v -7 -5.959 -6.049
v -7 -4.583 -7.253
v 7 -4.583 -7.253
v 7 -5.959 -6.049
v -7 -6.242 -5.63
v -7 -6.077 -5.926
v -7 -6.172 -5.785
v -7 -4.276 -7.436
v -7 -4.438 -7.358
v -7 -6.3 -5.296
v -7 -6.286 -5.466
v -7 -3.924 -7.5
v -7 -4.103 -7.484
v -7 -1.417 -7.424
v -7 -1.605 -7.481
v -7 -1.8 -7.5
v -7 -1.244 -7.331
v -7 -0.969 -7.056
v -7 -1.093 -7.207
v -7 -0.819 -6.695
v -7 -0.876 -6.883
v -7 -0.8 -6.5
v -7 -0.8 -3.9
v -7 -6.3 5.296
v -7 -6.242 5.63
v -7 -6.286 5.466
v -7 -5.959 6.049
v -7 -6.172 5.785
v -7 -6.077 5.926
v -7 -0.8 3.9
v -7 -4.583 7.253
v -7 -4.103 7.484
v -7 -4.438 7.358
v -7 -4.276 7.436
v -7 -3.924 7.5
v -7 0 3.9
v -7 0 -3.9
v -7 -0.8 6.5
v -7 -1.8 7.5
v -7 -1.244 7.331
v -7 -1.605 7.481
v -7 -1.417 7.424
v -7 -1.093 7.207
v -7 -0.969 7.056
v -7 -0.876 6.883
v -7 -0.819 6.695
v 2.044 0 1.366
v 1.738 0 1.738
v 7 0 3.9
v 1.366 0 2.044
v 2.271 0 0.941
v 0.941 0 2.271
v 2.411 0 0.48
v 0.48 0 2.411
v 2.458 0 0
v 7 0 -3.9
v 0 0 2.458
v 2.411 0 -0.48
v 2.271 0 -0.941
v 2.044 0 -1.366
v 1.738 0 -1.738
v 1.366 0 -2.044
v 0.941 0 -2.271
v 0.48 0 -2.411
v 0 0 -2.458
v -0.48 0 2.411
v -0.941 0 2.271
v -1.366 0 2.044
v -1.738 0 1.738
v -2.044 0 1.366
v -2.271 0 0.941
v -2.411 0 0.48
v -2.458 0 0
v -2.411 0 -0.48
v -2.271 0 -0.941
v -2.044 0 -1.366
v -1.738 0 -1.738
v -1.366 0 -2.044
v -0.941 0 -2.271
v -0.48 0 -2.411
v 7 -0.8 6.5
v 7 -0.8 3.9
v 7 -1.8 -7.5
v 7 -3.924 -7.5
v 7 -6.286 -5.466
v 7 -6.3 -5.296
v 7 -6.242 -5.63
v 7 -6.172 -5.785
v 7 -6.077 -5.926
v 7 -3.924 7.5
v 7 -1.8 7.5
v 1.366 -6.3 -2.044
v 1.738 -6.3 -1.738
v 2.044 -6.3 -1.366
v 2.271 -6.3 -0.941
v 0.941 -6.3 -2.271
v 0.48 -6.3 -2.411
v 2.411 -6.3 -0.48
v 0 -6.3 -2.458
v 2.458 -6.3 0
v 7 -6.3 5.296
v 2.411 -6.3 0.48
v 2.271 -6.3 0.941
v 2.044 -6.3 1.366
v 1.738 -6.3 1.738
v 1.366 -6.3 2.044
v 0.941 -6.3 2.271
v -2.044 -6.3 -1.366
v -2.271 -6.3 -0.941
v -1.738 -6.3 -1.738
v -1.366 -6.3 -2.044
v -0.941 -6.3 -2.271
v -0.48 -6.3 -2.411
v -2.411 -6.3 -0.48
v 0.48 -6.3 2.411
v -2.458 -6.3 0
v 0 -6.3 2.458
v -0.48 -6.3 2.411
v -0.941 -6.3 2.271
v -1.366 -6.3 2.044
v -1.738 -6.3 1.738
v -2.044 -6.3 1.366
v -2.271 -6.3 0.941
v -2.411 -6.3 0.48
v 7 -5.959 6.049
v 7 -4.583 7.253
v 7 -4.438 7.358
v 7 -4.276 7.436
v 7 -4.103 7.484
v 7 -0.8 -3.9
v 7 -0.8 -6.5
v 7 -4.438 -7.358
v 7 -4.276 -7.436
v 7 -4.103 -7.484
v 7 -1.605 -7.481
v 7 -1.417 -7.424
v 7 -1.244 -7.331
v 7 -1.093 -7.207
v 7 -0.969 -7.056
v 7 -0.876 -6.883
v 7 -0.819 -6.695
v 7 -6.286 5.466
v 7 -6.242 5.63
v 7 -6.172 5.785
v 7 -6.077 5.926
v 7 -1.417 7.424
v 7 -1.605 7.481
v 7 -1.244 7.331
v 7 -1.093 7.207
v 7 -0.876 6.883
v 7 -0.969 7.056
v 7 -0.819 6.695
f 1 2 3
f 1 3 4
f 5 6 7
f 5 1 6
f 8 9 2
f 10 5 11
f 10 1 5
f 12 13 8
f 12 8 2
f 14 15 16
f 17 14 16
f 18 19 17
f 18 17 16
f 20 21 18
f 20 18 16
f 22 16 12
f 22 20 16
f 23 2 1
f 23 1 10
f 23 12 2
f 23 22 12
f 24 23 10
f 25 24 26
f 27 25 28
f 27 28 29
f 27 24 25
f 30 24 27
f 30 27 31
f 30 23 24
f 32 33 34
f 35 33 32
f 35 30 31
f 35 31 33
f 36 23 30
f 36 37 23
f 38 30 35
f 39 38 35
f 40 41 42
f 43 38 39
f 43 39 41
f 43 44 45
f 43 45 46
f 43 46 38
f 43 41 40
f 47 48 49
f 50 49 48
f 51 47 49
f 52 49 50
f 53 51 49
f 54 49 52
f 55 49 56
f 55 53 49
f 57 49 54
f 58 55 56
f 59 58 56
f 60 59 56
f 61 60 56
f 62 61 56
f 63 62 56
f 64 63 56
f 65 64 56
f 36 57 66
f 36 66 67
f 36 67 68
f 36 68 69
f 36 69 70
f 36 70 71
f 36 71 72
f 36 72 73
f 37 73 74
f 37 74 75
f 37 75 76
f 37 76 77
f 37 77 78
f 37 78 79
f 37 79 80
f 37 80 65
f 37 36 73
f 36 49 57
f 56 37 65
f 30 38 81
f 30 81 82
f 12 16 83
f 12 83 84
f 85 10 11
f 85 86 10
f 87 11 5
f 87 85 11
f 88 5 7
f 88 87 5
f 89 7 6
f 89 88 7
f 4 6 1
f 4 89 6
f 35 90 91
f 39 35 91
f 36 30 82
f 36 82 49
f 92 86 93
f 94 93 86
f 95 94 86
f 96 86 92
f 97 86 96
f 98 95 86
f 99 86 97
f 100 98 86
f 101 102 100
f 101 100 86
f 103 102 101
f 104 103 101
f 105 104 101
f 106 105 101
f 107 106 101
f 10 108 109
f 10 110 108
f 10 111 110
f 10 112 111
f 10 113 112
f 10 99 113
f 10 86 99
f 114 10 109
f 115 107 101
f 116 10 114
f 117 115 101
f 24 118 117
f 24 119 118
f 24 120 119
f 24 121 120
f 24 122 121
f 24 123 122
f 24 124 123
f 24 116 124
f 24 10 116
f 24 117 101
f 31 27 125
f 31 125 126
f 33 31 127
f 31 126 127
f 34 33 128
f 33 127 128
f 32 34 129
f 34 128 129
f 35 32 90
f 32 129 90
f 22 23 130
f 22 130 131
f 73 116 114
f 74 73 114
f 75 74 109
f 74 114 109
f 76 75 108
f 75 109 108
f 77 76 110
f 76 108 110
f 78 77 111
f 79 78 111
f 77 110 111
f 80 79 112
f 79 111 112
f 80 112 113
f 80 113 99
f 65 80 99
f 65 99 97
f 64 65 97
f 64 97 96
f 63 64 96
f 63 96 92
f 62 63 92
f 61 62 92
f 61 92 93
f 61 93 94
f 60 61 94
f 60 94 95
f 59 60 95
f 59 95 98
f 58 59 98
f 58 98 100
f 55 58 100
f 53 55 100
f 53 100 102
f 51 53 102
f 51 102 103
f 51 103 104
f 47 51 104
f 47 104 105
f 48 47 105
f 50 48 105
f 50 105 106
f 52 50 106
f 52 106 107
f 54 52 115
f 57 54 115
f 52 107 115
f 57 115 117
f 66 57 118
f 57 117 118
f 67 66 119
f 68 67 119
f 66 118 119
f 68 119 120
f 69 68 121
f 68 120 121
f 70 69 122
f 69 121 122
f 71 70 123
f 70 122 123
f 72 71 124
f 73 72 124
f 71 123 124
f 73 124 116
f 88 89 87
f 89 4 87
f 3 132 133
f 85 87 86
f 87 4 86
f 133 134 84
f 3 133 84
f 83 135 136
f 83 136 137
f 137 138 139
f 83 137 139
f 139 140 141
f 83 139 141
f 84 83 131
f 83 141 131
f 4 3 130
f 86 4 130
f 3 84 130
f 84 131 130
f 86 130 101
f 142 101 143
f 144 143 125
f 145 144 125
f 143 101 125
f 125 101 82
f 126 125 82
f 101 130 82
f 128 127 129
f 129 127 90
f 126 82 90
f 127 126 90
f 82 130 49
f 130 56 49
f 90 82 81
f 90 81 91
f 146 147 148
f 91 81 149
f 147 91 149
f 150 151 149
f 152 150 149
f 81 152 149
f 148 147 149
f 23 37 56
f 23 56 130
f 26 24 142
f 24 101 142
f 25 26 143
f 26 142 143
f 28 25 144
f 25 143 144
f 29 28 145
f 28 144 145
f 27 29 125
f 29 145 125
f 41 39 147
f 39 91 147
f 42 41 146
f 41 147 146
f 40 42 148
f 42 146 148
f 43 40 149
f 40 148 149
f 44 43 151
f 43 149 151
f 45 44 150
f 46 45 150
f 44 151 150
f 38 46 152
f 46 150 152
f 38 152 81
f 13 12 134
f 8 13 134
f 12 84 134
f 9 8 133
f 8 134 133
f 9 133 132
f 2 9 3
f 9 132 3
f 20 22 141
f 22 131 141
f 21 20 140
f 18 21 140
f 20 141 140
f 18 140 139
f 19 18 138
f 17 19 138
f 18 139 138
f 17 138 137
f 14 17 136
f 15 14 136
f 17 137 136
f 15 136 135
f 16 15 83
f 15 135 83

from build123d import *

# Parameters (mm, degrees)
BOSS_EXTRUDE1_DEPTH = 14
FILLET1_R           = 1
TAPPED_HOLE1_D      = 4.917


with BuildPart() as part:
    # Sketch1 → Boss-Extrude1 (new body)
    with BuildSketch(Plane(origin=(-7, 0, 0), x_dir=(0, 0, -1), z_dir=(1, 0, 0))):
        Polygon((5.75, -6.3), (-5.75, -6.3), (-7.5, -4.3), (-7.5, -0.8), (-3.9, -0.8), (-3.9, 0), (3.9, 0), (3.9, -0.8), (7.5, -0.8), (7.5, -4.3), align=None)
    extrude(amount=BOSS_EXTRUDE1_DEPTH)

    # Fillet1
    fillet1_edges = [part.edges().sort_by_distance(p)[0] for p in [
        (0, -0.8, -7.5),
        (0, -4.3, -7.5),
        (0, -6.3, -5.75),
        (0, -6.3, 5.75),
        (0, -4.3, 7.5),
        (0, -0.8, 7.5),
    ]]
    fillet(fillet1_edges, radius=FILLET1_R)

    # Tapped Hole1 (through all)
    with Locations(Plane(origin=(0, 0, 0), x_dir=(1, 0, 0), z_dir=(0, 1, 0))):
        with Locations((0, 0)):
            Hole(TAPPED_HOLE1_D / 2)


solid = part.part
